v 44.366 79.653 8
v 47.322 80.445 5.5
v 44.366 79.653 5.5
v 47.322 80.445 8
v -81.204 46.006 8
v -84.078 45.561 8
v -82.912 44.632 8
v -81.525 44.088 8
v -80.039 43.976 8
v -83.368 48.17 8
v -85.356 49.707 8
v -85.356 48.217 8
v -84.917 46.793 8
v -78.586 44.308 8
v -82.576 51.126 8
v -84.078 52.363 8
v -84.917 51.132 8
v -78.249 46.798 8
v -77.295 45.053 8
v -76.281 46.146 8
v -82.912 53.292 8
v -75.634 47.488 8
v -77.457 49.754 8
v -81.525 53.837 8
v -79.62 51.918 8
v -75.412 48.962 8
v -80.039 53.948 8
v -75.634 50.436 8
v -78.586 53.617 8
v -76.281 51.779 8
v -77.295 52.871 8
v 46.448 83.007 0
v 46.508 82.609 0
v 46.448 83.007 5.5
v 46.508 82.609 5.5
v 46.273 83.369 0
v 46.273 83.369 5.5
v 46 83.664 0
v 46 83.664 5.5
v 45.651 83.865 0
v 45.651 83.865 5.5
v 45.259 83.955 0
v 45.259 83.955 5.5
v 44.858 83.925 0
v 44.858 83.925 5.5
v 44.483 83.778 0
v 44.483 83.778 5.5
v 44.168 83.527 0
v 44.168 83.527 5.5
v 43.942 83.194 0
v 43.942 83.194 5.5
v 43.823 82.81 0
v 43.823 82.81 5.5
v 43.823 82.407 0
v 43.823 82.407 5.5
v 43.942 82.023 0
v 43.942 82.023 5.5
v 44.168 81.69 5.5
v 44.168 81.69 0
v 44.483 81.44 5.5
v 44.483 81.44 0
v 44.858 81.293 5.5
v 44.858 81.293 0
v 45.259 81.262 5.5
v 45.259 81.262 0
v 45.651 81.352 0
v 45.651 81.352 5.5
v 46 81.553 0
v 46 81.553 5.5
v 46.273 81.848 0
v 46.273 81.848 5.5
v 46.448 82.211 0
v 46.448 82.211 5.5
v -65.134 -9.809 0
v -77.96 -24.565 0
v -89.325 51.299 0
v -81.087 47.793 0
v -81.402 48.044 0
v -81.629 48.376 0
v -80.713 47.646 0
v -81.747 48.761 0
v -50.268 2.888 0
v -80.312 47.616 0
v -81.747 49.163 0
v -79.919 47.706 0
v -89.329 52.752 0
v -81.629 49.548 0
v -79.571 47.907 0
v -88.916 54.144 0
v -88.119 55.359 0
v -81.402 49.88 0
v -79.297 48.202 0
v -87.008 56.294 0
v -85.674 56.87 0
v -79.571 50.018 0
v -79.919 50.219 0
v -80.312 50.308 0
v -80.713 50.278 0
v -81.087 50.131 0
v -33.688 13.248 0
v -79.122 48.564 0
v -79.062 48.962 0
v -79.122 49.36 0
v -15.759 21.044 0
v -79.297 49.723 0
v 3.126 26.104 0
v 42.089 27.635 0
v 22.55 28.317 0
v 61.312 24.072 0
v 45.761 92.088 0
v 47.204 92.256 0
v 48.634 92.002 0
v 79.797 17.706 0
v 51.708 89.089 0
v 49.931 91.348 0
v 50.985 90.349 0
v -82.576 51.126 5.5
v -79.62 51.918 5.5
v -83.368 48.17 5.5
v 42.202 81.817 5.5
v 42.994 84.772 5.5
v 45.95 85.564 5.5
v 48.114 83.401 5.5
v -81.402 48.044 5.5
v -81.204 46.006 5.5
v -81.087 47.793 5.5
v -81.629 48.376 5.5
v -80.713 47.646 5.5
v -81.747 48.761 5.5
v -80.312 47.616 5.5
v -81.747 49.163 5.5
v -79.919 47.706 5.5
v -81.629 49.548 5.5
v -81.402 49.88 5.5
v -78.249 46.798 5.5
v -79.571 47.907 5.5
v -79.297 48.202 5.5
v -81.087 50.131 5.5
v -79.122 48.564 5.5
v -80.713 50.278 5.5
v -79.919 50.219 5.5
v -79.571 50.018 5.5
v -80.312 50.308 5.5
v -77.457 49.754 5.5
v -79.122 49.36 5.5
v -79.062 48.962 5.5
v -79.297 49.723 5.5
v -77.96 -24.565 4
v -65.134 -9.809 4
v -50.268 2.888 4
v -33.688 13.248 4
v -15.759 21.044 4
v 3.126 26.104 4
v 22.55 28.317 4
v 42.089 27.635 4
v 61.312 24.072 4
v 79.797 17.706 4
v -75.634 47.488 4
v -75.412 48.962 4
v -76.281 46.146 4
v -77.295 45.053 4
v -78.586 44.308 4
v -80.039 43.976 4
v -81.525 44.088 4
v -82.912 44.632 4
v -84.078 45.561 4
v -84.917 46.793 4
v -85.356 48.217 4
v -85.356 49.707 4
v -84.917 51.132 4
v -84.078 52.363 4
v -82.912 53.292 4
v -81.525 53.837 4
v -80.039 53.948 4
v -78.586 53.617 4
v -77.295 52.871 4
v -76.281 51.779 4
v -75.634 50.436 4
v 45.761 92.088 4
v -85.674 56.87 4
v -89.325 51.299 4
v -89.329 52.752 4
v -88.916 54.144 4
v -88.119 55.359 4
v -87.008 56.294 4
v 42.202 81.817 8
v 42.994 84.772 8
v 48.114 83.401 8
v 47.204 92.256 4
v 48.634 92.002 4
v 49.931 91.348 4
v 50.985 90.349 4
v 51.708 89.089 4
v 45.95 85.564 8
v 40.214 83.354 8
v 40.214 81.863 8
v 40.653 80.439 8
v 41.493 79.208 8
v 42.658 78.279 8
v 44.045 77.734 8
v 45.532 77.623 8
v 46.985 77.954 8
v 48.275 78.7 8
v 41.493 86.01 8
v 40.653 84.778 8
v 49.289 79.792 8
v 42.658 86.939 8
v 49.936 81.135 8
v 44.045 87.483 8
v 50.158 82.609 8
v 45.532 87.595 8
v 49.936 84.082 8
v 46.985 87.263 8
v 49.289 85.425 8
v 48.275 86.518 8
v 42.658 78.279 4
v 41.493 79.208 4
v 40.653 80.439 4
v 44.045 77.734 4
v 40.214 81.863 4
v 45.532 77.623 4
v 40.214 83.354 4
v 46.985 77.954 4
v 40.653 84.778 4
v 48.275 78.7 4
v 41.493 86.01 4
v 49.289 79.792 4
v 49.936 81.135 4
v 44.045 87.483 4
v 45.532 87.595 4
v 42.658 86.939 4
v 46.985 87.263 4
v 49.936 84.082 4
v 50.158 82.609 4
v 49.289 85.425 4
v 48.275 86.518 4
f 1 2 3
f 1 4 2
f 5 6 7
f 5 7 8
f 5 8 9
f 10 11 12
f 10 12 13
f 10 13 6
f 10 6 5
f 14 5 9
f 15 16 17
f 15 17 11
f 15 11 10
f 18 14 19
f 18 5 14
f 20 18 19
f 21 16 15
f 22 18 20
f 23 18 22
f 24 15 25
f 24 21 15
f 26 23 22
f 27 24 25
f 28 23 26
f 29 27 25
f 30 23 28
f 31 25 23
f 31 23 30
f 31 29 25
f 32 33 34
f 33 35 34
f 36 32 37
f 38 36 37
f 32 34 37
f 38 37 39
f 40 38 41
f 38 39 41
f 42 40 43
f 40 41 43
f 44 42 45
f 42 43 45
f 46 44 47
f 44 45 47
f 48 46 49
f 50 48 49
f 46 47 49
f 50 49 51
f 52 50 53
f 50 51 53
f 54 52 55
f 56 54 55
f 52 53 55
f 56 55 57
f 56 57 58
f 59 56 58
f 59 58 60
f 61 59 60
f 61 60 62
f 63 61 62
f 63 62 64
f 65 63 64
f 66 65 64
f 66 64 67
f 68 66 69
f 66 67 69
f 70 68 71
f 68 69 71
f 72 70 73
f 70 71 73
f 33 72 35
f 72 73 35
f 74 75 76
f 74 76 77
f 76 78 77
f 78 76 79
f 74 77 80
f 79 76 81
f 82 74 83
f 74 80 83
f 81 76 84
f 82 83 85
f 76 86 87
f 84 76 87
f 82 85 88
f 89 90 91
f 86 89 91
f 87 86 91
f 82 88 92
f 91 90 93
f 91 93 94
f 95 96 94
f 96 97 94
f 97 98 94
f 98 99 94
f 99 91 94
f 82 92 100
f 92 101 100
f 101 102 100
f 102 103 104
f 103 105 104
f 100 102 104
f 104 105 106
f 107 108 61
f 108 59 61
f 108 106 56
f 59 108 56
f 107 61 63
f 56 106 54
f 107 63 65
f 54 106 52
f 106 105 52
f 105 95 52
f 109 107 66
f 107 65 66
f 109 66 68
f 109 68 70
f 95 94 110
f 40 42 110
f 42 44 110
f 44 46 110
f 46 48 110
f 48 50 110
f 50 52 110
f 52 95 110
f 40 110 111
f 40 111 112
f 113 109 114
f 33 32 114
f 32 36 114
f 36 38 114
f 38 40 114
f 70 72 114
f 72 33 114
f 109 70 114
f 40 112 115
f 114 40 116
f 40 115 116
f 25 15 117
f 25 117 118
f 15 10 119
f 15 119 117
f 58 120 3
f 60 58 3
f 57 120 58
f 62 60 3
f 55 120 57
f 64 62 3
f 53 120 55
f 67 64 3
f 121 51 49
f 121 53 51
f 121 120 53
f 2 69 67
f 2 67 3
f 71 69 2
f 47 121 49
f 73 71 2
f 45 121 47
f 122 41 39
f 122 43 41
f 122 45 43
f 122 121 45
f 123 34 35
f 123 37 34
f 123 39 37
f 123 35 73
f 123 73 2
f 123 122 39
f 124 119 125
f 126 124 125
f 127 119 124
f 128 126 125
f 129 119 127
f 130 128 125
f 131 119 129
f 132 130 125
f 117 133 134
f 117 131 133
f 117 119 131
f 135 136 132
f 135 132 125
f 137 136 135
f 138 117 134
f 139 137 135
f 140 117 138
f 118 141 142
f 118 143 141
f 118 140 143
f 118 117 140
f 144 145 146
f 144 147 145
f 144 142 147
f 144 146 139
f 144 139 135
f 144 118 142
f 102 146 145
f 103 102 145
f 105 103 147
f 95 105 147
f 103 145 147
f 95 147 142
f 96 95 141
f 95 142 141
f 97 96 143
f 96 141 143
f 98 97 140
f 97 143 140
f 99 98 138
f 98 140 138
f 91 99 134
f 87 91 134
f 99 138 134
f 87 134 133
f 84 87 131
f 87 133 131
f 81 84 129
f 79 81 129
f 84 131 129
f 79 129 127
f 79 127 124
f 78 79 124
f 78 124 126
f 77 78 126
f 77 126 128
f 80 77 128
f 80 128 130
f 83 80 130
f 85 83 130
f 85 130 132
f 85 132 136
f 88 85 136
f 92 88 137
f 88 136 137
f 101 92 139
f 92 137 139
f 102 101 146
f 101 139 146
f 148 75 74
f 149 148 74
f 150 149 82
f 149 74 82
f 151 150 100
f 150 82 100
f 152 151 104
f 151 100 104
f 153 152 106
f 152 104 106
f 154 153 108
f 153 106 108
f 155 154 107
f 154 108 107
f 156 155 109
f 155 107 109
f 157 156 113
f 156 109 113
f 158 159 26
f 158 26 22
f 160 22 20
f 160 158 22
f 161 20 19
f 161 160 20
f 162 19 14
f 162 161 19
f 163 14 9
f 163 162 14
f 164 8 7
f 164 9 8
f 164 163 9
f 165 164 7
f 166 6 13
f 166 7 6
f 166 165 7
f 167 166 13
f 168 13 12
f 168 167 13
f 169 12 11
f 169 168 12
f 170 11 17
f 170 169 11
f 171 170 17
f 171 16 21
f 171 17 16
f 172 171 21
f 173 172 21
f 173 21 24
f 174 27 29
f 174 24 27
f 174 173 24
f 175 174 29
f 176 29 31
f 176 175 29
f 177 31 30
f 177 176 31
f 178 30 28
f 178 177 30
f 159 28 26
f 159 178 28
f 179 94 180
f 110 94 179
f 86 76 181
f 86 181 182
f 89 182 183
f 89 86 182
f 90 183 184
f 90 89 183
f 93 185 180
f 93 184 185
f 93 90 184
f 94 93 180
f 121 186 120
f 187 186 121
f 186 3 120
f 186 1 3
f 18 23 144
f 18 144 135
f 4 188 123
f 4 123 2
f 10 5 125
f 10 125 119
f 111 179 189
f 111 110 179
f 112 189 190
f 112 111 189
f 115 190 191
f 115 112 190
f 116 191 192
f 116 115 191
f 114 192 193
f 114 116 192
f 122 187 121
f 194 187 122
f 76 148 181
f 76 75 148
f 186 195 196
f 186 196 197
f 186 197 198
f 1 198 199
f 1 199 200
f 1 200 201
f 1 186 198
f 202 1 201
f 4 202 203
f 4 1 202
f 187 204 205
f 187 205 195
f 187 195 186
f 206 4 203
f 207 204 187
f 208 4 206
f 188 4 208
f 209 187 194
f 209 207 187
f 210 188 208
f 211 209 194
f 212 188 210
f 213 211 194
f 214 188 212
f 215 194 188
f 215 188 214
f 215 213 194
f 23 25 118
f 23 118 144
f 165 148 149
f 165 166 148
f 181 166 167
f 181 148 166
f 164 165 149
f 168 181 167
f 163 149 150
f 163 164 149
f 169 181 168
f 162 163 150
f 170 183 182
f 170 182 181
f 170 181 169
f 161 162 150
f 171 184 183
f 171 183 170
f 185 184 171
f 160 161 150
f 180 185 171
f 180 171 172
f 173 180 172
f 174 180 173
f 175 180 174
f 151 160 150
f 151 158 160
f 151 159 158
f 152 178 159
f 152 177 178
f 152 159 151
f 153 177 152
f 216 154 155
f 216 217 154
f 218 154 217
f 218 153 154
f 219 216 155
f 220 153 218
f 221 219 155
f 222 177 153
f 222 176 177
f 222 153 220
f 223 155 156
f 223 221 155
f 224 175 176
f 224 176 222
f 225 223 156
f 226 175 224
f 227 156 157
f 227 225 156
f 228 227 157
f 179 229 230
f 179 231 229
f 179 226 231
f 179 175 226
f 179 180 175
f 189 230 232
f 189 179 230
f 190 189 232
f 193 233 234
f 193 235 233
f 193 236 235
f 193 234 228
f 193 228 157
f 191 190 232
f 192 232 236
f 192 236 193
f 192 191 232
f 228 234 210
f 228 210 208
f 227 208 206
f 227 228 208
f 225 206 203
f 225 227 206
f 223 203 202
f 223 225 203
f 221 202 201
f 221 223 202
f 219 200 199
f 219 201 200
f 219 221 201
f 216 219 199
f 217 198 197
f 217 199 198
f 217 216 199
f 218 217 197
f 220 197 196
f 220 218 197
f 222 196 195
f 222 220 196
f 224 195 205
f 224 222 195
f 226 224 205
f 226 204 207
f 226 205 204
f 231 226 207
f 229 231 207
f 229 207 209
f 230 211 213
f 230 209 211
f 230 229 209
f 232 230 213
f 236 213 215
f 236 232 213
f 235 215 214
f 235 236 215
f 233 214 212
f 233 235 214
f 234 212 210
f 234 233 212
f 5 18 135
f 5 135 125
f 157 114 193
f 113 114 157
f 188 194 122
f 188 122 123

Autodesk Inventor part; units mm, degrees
ref_plane "YZ Plane" through (0, 0, 0) normal (1, 0, 0) x (0, 1, 0)
ref_plane "XZ Plane" through (0, 0, 0) normal (0, 1, 0) x (-1, 0, 0)
ref_plane "XY Plane" through (0, 0, 0) normal (0, 0, 1) x (1, 0, 0)
ref_plane "Płaszczyzna konstrukcyjna1" through (0, 0, 0) normal (0, 0, 1) x (1, 0, 0)
sketch "Szkic1" plane through (0, 0, 0) normal (0, 0, 1) x (1, 0, 0)
  line L0 (-77.9596, -24.5647) -> (-89.3248, 51.2994) projected
  arc A0 (-85.674, 56.8699) -> (-89.3248, 51.2994) centre (-84.3799, 52.0402) ccw projected
  line L1 (-85.674, 56.8699) -> (45.761, 92.0878) projected
  arc A1 (51.7078, 89.089) -> (45.761, 92.0878) centre (47.0551, 87.2581) ccw projected
  line L2 (51.7078, 89.089) -> (79.7973, 17.7061) projected
  circle A2 centre (27.7277, -103.4811) radius 131.9 projected
  line L3 (-77.9596, -24.5647) -> (-89.3248, 51.2994)
  line L4 (79.7973, 17.7061) -> (51.7078, 89.089)
  arc A3 (79.7973, 17.7061) -> (-77.9596, -24.5647) centre (27.7277, -103.4811) ccw
  arc A4 (-85.674, 56.8699) -> (-89.3248, 51.2994) centre (-84.3799, 52.0402) ccw
  arc A5 (51.7078, 89.089) -> (45.761, 92.0878) centre (47.0551, 87.2581) ccw
  line L5 (-85.674, 56.8699) -> (45.761, 92.0878)
  point P0 (0, 0)
extrude "Wyciągnięcie proste1" add sketch "Szkic1" along normal blind 4 contours L0 A0 L1 A1 L2 A2
sketch "Szkic2" plane through (0, 0, 4) normal (0, 0, 1) x (1, 0, 0)
  circle A0 centre (-80.4123, 48.9622) radius 5
  line L0 (-37.9291, 141.5533) -> (24.1284, -90.0484) construction
  line L1 (45.761, 92.0878) -> (-85.674, 56.8699) construction
  circle A1 centre (45.158, 82.6087) radius 5
  point P0 (0, 0)
  dimension "d2" = 10
  dimension "d3" = 65
  dimension "d4" = 9
extrude "Wyciągnięcie proste2" add sketch "Szkic2" along normal blind 4
sketch "Szkic3" plane through (45.158, 82.6087, 8) normal (0, 0, 1) x (1, 0, 0)
  circle A0 centre (0, 0) radius 5 projected
  circle A1 centre (-125.5704, -33.6465) radius 5 projected
  line L0 (-124.7784, -30.6908) -> (-122.6147, -32.8545)
  line L1 (-122.6147, -32.8545) -> (-123.4066, -35.8102)
  line L2 (-123.4066, -35.8102) -> (-126.3623, -36.6022)
  line L3 (-126.3623, -36.6022) -> (-128.526, -34.4385)
  line L4 (-128.526, -34.4385) -> (-127.7341, -31.4828)
  line L5 (-127.7341, -31.4828) -> (-124.7784, -30.6908)
  line L6 (0.792, 2.9557) -> (2.9557, 0.792)
  line L7 (2.9557, 0.792) -> (2.1637, -2.1637)
  line L8 (2.1637, -2.1637) -> (-0.792, -2.9557)
  line L9 (-0.792, -2.9557) -> (-2.9557, -0.792)
  line L10 (-2.9557, -0.792) -> (-2.1637, 2.1637)
  line L11 (-2.1637, 2.1637) -> (0.792, 2.9557)
  line L12 (0.6029, 9.479) -> (-130.832, -25.7389) projected
  point P0 (-45.158, -82.6087)
  dimension "d7" = 5.3
  dimension "d8" = 5.3
extrude "Wyciągnięcie proste3" cut sketch "Szkic3" against normal blind 2.5 contours L0 L1 L2 L3 L4 L5 | L6 L7 L8 L9 L10 L11
sketch "Szkic4" plane through (45.158, 82.6087, 5.5) normal (0, 0, 1) x (1, 0, 0)
  circle A0 centre (0, 0) radius 5 projected
  circle A1 centre (-125.5704, -33.6465) radius 5 projected
  circle A2 centre (0, 0) radius 1.35
  circle A3 centre (-125.5704, -33.6465) radius 1.35
  point P0 (-45.158, -82.6087)
  dimension "d11" = 2.7
  dimension "d12" = 2.7
extrude "Wyciągnięcie proste4" cut sketch "Szkic4" against normal up to next contours A2 | A3
equation "\"d8\" = d7"
equation "\"d12\" = d11"
properties part number "housing_undercover"
